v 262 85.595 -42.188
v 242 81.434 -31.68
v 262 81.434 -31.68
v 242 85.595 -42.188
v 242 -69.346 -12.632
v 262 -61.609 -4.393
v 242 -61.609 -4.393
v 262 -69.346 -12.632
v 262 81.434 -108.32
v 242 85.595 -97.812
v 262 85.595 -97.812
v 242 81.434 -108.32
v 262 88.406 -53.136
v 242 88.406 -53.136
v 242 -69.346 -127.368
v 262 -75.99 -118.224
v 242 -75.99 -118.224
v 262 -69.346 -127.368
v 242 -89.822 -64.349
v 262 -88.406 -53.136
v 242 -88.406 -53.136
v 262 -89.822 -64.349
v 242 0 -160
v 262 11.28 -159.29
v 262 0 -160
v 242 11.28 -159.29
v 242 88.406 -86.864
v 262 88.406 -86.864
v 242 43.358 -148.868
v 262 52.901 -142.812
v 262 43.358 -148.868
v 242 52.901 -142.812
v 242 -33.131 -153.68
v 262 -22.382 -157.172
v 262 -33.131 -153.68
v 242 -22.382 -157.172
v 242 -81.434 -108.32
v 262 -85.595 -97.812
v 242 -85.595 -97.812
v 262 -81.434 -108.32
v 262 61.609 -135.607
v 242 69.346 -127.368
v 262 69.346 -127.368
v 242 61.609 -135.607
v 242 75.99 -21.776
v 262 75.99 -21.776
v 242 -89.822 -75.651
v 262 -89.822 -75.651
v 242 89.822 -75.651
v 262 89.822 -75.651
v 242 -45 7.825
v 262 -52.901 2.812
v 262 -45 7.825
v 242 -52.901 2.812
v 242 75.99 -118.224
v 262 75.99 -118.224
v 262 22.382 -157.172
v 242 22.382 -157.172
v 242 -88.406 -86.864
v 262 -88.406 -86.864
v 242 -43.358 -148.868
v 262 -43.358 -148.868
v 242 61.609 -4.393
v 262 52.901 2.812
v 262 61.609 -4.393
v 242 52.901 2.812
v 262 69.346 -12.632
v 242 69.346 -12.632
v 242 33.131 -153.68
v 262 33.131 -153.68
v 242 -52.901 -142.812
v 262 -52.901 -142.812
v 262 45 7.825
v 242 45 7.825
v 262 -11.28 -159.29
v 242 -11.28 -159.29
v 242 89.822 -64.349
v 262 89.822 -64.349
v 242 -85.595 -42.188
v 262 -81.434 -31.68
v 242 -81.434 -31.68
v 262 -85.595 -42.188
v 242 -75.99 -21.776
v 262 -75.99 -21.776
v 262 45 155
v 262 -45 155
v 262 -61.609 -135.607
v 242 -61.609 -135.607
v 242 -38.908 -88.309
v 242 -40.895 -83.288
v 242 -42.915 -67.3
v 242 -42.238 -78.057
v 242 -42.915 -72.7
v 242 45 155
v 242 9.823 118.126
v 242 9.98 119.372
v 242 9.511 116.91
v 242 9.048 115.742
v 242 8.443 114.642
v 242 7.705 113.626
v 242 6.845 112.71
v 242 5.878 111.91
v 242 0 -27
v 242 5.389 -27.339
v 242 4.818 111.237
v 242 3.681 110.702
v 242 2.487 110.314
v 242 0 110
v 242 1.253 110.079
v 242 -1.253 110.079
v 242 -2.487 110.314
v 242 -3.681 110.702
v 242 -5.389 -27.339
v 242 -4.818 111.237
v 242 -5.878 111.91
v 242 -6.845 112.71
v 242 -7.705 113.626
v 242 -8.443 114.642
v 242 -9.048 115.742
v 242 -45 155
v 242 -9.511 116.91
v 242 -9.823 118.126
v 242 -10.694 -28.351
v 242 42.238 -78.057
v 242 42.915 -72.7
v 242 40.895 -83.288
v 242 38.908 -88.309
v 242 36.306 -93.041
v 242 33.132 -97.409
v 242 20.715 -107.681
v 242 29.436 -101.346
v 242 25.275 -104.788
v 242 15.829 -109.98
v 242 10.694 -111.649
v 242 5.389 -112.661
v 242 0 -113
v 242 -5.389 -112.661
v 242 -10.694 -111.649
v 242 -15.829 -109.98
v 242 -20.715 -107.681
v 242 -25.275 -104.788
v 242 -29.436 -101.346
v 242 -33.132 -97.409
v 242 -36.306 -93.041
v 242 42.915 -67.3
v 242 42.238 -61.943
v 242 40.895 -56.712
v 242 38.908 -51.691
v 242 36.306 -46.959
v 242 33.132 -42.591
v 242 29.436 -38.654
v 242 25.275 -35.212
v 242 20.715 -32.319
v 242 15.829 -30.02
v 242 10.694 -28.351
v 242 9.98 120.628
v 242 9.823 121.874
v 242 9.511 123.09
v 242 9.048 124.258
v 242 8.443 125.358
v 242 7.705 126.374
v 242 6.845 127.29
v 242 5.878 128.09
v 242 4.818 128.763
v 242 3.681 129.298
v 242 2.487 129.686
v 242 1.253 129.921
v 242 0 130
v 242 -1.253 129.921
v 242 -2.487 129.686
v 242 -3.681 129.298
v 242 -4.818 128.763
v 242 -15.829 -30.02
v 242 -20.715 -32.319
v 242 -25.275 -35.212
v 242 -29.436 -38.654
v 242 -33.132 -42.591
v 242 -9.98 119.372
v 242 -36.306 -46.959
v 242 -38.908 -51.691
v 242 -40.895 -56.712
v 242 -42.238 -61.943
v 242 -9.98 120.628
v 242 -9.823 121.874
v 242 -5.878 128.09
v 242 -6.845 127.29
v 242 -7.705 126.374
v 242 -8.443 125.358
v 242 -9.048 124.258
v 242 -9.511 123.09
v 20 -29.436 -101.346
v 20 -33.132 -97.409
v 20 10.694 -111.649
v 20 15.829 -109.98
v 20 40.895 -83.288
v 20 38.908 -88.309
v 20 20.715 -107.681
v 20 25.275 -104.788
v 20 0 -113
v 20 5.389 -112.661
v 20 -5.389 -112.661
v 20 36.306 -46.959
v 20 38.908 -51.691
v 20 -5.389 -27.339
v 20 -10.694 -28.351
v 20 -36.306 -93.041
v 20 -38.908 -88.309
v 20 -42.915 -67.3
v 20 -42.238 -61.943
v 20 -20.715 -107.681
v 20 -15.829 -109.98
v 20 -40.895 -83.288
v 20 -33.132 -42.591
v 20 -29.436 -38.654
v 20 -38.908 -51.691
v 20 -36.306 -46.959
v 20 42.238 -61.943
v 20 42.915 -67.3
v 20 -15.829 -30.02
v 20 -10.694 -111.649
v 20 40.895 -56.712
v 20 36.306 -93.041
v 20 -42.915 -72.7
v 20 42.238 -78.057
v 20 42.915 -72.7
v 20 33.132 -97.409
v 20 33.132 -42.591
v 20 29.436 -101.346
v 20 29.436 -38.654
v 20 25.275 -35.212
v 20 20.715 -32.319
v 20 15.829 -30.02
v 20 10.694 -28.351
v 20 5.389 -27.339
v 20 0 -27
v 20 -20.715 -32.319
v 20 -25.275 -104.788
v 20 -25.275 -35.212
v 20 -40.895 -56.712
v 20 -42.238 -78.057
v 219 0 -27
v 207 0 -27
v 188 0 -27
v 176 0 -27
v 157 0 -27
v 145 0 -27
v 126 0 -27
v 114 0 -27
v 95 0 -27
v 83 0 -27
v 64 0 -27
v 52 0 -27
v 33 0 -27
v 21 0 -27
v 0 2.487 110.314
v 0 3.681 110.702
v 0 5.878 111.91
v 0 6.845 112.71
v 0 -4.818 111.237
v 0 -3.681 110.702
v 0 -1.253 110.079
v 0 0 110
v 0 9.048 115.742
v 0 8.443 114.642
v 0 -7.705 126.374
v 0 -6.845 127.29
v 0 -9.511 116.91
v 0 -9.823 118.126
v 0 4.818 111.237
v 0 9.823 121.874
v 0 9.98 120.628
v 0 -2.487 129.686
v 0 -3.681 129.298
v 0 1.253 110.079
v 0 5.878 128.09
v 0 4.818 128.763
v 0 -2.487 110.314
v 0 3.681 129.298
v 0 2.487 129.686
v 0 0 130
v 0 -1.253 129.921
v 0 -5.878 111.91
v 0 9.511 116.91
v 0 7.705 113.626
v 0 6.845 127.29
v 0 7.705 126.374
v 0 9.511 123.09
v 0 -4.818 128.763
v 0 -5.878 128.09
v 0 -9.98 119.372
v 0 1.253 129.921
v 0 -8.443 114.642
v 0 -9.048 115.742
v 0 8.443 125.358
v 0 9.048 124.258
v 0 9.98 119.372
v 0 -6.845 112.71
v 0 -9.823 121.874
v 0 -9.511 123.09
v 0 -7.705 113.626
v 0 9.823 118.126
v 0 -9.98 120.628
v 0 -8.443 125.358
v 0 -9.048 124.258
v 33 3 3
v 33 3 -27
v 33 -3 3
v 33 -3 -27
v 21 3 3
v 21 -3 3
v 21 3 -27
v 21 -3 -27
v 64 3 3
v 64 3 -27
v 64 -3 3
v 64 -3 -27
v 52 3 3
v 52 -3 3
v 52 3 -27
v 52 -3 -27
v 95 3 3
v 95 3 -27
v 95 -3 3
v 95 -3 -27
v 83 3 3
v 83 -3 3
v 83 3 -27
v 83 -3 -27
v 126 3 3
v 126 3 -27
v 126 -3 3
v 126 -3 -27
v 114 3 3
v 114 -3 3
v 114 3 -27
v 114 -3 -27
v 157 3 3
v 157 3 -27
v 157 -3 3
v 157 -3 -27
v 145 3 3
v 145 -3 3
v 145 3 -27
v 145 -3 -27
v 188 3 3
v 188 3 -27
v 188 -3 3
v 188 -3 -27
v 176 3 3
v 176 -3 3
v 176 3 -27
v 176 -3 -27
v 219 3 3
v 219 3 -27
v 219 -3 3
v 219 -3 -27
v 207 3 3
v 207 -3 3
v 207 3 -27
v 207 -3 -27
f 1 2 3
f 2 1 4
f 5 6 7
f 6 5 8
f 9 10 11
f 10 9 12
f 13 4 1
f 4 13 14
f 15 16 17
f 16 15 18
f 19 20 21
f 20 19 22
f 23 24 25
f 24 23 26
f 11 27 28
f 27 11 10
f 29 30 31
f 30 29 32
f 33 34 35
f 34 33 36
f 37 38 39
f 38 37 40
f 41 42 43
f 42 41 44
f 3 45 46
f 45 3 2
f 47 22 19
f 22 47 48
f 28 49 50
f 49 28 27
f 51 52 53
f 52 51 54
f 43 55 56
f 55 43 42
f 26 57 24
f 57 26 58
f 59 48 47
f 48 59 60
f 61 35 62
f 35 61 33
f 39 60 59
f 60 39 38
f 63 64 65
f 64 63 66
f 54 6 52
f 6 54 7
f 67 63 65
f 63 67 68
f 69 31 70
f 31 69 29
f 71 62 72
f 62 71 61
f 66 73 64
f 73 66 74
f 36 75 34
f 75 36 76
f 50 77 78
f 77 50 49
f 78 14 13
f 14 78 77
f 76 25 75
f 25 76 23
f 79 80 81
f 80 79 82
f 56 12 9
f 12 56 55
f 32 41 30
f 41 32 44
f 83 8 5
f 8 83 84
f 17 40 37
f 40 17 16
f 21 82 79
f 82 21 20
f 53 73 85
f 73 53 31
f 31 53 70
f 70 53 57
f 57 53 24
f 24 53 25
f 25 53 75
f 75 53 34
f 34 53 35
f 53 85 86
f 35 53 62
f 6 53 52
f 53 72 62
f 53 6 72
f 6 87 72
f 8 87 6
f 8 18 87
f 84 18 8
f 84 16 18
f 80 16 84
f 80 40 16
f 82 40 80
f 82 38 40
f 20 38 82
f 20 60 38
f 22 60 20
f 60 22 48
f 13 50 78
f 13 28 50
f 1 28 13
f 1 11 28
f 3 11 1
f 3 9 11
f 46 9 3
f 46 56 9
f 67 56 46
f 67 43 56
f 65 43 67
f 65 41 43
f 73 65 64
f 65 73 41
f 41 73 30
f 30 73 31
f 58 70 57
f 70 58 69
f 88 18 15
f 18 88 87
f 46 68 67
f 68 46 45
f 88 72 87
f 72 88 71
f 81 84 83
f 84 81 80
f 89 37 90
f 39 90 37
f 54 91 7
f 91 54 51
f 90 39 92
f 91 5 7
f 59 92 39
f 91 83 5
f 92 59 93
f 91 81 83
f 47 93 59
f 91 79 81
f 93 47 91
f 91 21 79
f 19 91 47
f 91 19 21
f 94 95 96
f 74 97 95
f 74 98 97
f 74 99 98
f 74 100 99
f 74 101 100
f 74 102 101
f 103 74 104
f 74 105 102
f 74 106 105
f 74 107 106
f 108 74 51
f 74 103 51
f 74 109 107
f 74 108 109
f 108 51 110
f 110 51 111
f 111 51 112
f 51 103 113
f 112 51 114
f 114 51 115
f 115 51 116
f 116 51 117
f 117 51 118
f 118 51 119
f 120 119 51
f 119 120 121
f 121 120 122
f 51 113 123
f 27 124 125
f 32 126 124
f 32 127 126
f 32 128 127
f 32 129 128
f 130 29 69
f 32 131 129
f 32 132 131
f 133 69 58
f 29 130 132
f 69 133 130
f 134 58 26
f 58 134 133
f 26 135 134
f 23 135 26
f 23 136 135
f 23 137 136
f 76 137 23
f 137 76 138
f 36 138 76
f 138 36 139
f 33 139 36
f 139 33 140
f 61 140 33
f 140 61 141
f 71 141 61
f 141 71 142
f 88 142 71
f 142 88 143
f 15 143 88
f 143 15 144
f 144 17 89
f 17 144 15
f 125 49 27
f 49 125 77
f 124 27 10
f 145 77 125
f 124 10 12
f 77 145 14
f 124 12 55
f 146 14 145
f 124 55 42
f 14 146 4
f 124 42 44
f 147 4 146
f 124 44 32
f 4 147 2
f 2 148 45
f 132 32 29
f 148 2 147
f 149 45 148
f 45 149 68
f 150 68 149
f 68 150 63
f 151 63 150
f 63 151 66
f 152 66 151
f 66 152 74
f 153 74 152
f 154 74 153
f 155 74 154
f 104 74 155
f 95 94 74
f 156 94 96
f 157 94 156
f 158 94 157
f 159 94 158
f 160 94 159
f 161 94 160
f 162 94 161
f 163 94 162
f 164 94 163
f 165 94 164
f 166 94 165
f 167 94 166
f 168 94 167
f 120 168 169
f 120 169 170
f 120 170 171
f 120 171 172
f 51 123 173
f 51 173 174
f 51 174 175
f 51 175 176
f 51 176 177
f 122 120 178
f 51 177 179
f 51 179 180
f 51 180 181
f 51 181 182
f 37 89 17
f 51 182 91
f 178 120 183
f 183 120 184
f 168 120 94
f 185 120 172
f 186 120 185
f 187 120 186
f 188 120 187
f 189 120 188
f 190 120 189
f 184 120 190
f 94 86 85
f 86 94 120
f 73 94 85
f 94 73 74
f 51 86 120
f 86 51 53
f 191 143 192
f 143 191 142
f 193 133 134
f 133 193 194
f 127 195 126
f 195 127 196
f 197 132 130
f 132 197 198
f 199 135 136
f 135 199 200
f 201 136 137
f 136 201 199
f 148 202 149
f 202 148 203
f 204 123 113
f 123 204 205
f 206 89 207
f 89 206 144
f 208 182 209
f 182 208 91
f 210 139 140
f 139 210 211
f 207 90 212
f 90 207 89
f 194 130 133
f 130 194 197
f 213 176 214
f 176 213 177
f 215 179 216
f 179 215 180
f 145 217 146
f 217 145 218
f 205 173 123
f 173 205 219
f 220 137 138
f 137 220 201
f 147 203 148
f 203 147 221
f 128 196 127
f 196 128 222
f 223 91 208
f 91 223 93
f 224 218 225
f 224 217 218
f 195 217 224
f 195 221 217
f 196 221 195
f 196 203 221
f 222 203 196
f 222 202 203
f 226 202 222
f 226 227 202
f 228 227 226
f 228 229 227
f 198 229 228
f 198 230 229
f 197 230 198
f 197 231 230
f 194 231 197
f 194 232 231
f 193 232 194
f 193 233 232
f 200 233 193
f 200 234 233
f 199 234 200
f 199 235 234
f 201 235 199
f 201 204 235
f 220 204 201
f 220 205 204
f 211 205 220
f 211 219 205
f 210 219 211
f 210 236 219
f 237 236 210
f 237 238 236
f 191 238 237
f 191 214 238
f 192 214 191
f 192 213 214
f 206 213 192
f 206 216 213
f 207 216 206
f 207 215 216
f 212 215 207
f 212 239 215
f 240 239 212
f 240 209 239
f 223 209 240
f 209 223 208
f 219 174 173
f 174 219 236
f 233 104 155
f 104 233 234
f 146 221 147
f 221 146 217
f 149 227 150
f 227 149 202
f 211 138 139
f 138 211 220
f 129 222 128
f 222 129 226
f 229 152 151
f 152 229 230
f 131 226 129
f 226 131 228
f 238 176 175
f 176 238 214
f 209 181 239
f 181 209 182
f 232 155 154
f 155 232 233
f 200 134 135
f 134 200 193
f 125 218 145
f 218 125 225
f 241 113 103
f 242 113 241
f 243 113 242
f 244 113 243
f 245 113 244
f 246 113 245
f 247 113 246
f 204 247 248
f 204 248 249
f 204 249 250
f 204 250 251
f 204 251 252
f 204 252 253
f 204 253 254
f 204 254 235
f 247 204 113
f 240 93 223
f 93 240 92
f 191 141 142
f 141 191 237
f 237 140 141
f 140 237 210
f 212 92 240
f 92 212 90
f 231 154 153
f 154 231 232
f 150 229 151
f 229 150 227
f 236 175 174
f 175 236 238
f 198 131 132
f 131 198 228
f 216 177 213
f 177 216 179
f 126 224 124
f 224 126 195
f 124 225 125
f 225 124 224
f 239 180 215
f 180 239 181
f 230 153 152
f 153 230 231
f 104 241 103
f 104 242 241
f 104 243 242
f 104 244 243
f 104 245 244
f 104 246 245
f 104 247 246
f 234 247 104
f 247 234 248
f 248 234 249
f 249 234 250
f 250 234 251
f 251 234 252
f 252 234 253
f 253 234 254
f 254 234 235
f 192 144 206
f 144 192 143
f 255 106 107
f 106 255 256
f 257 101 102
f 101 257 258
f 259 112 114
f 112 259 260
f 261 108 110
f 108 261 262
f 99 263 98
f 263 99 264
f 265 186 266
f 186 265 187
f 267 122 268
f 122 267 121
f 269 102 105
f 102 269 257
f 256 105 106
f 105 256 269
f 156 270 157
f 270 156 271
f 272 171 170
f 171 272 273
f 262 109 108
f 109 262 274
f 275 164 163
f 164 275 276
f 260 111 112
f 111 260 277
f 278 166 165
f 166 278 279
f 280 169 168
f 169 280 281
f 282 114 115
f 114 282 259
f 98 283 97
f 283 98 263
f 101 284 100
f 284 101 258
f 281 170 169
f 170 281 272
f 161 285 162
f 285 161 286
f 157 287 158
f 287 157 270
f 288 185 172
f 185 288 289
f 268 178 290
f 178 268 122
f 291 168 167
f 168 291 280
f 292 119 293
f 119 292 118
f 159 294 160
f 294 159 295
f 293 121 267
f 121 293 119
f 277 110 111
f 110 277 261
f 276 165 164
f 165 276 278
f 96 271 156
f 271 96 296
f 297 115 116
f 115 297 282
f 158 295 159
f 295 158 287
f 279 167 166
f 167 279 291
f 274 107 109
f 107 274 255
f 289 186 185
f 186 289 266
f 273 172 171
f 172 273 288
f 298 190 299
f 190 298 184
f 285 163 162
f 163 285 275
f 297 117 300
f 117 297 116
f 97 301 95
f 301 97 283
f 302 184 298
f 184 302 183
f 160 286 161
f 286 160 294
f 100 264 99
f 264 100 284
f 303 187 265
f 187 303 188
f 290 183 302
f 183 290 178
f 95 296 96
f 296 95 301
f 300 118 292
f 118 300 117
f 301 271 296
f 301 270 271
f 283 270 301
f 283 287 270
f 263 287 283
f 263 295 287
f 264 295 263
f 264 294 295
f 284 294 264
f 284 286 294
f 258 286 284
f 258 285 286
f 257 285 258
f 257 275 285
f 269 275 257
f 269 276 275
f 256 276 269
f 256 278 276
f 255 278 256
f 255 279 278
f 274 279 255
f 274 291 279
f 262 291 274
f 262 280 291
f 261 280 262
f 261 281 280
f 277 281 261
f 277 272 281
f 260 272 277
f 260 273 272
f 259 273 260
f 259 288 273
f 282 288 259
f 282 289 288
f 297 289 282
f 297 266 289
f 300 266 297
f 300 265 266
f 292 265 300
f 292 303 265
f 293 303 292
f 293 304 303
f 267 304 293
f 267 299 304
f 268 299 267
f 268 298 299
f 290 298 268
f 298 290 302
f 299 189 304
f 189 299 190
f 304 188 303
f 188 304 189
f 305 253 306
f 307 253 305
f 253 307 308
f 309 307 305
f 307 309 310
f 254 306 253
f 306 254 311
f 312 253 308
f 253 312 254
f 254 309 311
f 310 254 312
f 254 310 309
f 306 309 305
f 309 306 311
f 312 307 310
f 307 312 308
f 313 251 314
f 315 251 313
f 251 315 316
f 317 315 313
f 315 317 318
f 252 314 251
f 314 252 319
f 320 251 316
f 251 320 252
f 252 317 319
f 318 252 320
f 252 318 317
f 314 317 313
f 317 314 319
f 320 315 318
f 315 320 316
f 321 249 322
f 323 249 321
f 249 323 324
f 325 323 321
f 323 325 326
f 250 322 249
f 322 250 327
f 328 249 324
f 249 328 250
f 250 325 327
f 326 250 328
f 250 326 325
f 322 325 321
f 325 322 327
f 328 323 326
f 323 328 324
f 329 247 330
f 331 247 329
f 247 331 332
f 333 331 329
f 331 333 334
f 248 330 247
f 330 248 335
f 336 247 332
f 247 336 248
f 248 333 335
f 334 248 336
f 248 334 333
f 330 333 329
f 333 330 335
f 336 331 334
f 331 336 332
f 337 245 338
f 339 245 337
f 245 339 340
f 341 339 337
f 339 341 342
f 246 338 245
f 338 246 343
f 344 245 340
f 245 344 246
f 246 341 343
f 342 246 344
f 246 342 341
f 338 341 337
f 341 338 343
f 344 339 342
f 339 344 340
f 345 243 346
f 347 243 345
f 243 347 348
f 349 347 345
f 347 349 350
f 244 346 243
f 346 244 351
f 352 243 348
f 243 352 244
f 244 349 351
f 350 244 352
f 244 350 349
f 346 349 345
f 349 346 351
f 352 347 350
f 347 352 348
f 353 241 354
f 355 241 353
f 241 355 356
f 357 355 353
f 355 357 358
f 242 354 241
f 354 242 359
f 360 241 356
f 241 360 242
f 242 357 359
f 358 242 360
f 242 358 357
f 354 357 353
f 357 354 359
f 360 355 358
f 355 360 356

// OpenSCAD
union () {
  translate ([213, 0, -12]) {
    cube ([12, 6, 30], center=true);
  }
  union () {
    translate ([182, 0, -12]) {
      cube ([12, 6, 30], center=true);
    }
    union () {
      translate ([151, 0, -12]) {
        cube ([12, 6, 30], center=true);
      }
      union () {
        translate ([120, 0, -12]) {
          cube ([12, 6, 30], center=true);
        }
        union () {
          translate ([89, 0, -12]) {
            cube ([12, 6, 30], center=true);
          }
          union () {
            translate ([58, 0, -12]) {
              cube ([12, 6, 30], center=true);
            }
            union () {
              translate ([27, 0, -12]) {
                cube ([12, 6, 30], center=true);
              }
              union () {
                translate ([131, 0, -70]) {
                  rotate (a=90.0, v=[0, 1, 0]) {
                    cylinder ($fn=50, h=222, r=43, center=true);
                  }
                }
                translate ([242, 0, 0]) {
                  union () {
                    translate ([10, 0, -70]) {
                      rotate (a=90.0, v=[0, 1, 0]) {
                        cylinder ($fn=50, h=20, r=90, center=true);
                      }
                    }
                    translate ([10, 0, 65]) {
                      cube ([20, 90, 180], center=true);
                    }
                  }
                }
                translate ([121, 0, 120]) {
                  rotate (a=90.0, v=[0, 1, 0]) {
                    cylinder ($fn=50, h=242, r=10, center=true);
                  }
                }
              }
            }
          }
        }
      }
    }
  }
}
